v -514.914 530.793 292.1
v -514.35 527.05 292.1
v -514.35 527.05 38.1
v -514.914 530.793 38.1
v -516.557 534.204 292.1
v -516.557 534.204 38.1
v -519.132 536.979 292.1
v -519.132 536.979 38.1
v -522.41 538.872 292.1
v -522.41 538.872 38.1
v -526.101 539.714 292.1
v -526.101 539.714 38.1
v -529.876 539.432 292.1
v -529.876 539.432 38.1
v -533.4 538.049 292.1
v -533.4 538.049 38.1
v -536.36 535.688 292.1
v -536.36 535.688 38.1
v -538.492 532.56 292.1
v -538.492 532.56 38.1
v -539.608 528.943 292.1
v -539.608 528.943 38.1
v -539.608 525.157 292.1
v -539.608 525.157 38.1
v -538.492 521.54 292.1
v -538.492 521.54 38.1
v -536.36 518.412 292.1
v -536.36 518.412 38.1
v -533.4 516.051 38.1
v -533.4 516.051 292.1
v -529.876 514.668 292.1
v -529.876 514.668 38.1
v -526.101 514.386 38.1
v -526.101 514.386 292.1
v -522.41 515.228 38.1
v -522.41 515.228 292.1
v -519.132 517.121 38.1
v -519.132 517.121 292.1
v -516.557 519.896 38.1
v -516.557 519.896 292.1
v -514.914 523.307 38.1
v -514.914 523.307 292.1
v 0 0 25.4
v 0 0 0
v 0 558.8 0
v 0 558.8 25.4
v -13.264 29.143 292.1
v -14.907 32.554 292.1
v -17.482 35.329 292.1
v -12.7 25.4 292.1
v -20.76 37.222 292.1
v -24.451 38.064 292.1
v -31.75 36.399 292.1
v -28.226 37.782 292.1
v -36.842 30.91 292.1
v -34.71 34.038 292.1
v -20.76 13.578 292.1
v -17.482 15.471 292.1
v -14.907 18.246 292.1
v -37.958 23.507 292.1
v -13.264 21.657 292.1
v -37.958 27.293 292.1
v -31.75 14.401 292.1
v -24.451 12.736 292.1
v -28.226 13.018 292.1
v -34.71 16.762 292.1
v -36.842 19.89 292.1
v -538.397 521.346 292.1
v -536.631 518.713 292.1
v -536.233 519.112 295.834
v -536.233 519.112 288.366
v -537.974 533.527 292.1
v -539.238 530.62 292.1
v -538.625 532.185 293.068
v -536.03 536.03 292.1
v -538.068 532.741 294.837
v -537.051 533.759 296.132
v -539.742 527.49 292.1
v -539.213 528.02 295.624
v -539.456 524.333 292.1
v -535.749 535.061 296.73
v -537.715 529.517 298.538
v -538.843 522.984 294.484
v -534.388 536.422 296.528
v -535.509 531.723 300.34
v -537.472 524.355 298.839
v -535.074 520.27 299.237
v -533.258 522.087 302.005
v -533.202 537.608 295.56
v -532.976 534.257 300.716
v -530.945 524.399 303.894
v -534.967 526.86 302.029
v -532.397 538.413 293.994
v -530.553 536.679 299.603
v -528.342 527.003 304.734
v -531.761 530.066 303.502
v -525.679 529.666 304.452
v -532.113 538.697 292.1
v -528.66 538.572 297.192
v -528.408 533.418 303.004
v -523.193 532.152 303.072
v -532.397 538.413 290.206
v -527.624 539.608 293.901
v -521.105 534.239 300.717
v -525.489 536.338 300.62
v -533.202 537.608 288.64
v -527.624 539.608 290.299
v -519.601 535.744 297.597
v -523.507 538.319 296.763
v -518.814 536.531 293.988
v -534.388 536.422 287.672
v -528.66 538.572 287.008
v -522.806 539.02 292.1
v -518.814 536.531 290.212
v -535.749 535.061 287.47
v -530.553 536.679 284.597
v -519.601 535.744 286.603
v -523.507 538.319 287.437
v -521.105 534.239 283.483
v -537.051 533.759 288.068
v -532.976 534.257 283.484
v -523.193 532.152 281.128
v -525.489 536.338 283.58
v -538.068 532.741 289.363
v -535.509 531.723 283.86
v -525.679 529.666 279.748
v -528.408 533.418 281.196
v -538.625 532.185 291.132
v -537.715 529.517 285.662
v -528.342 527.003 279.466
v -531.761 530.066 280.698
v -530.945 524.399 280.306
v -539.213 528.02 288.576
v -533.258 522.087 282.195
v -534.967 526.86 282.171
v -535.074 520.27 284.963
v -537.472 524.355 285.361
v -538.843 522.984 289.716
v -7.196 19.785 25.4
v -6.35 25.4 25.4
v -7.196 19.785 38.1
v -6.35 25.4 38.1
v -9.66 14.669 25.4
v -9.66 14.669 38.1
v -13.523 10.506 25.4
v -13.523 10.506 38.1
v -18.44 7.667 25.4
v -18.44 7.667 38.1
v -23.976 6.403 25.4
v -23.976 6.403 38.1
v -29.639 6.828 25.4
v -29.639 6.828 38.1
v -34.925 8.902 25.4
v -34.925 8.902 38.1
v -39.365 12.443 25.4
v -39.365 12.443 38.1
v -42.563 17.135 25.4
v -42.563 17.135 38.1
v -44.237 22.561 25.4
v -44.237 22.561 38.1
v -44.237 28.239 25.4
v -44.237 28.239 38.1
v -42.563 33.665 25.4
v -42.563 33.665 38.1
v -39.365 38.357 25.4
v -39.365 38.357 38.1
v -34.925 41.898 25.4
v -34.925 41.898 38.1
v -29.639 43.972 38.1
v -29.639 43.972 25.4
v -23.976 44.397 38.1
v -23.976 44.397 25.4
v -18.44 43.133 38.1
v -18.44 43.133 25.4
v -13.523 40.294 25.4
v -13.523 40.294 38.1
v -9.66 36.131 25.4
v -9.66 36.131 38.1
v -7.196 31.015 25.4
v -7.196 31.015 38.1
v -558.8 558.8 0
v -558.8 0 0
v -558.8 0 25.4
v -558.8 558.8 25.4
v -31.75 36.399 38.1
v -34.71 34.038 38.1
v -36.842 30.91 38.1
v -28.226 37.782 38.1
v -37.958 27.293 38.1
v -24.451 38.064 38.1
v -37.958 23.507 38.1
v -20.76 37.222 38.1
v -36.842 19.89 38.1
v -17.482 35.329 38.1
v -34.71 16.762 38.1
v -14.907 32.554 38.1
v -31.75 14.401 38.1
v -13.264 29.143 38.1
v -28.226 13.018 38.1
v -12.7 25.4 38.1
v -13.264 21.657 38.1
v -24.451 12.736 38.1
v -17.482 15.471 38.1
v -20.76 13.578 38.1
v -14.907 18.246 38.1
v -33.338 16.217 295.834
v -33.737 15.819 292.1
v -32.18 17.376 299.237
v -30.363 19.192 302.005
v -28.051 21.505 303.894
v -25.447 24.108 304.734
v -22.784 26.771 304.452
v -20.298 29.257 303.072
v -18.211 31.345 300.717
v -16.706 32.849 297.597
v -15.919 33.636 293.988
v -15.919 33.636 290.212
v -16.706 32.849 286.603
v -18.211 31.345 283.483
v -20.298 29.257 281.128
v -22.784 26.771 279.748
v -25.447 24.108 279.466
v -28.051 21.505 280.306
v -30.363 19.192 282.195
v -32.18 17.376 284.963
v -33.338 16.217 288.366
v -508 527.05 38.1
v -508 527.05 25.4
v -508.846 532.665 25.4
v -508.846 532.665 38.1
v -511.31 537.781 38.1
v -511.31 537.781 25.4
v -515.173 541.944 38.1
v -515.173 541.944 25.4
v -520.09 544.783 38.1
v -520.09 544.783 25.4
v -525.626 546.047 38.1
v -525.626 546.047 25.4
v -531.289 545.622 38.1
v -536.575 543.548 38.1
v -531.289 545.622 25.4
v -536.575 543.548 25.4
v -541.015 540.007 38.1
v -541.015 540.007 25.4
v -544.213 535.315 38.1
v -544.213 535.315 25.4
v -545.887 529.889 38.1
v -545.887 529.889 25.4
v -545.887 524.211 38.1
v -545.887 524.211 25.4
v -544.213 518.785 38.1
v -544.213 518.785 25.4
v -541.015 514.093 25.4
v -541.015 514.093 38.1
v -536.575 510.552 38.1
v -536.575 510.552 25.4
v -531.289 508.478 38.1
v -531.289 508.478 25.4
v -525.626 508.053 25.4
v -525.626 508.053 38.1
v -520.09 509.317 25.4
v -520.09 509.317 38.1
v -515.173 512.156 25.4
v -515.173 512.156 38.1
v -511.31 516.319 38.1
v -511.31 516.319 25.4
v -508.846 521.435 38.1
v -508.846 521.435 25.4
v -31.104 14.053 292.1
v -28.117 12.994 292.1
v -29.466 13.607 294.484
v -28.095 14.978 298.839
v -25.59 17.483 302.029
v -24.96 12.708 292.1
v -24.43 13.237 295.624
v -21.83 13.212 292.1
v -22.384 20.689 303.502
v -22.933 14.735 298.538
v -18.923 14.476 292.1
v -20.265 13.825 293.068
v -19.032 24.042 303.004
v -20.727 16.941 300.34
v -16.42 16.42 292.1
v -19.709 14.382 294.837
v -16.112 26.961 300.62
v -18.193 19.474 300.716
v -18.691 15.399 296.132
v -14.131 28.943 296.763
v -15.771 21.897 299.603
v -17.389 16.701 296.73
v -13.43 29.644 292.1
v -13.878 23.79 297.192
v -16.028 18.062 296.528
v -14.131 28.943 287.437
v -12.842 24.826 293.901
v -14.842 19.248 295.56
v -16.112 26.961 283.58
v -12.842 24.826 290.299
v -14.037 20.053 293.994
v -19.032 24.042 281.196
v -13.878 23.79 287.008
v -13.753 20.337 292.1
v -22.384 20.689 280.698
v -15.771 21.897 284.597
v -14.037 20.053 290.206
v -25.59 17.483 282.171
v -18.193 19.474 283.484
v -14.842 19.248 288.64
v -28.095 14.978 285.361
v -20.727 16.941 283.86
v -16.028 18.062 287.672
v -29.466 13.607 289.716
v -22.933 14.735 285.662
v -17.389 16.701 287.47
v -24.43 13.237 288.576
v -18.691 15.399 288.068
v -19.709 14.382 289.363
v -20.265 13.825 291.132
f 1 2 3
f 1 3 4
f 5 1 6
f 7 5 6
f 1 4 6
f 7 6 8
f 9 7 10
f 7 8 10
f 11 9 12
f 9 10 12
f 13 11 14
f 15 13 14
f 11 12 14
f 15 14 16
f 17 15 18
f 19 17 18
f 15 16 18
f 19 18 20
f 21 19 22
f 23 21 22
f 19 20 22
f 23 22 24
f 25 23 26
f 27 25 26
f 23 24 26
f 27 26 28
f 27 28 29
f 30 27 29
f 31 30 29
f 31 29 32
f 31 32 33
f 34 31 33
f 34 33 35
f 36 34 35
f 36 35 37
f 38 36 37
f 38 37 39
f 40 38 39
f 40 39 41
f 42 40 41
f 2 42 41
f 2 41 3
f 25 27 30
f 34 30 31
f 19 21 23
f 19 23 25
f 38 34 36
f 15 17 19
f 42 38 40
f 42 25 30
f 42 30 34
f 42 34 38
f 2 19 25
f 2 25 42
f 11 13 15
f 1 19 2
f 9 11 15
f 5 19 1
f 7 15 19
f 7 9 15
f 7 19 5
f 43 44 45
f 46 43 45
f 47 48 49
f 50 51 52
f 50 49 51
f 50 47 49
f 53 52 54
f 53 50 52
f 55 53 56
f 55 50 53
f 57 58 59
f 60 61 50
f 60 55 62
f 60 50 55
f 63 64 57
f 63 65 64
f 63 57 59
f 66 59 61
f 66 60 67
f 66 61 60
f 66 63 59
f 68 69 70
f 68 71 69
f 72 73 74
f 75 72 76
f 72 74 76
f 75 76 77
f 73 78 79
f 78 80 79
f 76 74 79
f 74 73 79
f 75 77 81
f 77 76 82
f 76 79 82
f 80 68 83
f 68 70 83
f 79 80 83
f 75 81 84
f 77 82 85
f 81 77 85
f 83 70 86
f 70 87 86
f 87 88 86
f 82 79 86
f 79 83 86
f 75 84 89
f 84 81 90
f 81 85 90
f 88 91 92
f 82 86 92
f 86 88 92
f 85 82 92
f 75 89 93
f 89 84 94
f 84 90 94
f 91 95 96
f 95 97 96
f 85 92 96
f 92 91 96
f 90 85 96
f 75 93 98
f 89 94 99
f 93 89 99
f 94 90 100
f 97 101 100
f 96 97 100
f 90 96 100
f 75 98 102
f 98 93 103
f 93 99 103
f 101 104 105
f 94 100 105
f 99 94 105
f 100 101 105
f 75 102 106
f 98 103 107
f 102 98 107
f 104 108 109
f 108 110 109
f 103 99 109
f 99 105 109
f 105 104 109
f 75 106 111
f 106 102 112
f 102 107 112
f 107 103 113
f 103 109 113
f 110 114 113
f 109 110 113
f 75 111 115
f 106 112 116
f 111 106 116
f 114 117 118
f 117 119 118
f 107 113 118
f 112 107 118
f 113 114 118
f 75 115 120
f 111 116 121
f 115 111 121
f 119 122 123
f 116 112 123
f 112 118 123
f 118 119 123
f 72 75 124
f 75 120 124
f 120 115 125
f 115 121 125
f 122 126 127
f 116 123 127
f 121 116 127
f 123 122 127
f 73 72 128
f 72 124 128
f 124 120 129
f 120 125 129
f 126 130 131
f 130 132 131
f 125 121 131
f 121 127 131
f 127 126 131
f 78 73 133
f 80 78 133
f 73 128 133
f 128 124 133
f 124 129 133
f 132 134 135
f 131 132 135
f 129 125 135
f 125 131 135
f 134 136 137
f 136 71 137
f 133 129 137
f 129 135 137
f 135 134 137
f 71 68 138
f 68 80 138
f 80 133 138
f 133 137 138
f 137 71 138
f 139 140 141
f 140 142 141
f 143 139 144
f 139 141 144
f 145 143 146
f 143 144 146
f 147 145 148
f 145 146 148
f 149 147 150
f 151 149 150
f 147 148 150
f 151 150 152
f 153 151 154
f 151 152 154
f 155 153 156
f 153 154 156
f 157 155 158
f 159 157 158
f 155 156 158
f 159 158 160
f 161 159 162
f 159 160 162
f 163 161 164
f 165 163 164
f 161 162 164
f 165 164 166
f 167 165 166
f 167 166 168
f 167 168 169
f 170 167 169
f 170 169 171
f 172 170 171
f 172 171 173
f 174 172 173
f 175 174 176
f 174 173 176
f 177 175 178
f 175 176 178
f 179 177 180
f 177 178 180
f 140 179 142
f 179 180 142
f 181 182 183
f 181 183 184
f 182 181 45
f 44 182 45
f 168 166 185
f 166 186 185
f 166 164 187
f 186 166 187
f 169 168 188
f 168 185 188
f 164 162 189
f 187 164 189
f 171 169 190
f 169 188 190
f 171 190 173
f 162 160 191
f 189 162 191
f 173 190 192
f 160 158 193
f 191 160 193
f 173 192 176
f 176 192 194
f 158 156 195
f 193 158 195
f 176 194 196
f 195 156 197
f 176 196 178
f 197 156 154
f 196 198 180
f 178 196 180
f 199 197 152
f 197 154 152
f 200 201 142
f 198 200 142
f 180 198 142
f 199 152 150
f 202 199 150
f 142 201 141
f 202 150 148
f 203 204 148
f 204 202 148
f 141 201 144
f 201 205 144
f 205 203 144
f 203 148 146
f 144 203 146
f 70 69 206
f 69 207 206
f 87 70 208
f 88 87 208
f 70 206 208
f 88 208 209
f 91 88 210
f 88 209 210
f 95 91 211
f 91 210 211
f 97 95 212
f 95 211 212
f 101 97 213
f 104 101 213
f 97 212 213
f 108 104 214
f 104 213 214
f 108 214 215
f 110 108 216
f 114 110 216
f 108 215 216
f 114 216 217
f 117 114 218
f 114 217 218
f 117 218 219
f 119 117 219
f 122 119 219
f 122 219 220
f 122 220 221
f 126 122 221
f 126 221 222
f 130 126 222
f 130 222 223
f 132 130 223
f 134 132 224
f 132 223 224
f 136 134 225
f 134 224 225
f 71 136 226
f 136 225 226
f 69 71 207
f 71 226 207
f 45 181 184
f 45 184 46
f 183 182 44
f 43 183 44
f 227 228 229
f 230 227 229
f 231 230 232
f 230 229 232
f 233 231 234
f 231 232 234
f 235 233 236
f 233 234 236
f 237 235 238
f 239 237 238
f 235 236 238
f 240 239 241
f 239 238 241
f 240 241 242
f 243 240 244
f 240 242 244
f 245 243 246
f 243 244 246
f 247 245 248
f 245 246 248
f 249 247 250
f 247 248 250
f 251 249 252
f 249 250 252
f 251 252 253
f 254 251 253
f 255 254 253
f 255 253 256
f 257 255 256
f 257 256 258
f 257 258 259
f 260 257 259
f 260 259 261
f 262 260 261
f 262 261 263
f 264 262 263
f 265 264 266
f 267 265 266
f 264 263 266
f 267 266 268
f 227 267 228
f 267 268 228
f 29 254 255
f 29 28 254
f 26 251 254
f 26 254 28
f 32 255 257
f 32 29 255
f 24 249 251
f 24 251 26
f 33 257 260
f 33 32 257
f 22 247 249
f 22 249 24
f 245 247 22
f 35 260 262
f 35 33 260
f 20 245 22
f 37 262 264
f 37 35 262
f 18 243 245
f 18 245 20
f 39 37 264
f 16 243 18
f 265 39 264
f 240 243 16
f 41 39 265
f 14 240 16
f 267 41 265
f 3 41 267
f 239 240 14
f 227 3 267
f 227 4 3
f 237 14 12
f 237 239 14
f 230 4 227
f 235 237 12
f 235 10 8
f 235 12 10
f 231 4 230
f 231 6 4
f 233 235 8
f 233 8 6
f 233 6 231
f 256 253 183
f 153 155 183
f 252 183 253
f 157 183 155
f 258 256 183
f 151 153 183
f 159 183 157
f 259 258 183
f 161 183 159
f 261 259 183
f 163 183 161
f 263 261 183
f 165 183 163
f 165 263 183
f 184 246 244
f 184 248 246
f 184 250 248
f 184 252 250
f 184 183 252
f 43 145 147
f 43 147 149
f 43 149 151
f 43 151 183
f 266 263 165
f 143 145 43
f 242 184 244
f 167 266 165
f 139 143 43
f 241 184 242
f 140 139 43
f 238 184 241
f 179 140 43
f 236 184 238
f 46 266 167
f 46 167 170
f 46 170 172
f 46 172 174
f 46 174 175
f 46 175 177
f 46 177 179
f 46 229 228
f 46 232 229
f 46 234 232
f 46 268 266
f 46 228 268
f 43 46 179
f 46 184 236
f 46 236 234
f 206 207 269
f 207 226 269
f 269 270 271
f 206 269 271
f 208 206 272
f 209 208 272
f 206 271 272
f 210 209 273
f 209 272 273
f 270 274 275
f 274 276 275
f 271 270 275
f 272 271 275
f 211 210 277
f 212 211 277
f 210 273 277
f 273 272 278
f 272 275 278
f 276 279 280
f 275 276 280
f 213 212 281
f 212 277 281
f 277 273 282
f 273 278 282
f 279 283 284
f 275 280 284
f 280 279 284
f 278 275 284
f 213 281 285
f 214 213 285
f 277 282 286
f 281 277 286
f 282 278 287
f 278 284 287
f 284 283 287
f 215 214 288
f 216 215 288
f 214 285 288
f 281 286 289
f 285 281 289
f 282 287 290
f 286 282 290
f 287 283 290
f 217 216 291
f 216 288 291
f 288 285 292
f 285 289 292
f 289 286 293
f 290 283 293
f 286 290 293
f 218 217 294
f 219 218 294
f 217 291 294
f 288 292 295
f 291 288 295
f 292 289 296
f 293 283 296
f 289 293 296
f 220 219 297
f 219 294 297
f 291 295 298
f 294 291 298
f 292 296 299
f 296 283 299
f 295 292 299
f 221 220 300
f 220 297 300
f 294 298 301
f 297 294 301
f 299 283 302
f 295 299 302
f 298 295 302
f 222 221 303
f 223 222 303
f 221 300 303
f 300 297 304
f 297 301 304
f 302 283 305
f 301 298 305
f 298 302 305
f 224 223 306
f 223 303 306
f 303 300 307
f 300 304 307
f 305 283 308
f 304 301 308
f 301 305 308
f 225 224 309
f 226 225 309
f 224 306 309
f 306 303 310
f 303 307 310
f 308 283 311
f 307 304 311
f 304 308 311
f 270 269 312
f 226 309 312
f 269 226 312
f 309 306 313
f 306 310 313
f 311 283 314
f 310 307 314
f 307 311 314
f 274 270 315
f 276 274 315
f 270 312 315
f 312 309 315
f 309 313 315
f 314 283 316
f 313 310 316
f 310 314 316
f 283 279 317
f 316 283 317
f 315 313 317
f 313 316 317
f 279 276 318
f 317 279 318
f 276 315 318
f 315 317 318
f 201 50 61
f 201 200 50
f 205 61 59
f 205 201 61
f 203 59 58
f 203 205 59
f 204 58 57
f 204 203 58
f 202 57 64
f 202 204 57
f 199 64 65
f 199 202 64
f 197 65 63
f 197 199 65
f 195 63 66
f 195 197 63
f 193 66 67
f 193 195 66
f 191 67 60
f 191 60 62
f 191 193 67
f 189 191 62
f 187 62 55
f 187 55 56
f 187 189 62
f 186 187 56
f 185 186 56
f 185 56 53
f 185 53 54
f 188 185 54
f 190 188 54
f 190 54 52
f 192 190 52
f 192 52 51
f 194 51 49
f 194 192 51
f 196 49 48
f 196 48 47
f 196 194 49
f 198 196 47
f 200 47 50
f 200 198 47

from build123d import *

# Parameters (mm, degrees)
F0_W     = 558.8
F0_H     = 558.8
F1_DEPTH = 25.4
F3_W     = 12.7
F3_H     = 12.7
F5_R     = 19.05
F5_R_2   = 12.7
F6_DEPTH = 12.7
F7_DEPTH = 266.7
F8_DEPTH = 241.3


with BuildPart() as f1:
    # F0 (on Top) → F1 (new body)
    with BuildSketch(Plane.XY):
        with Locations((-279.4, 279.4)):
            Rectangle(F0_W, F0_H)
    extrude(amount=F1_DEPTH)

    # F3 (on offset) → F4 (revolve)
    with BuildSketch(Plane.XZ.offset(-25.4)):
        with Locations((-19.05, 44.45)):
            Rectangle(F3_W, F3_H)
        Polygon((-12.7, 38.1), (-25.4, 38.1), (-25.4, 25.4), (-6.35, 25.4), (-6.35, 38.1), align=None)
    revolve(axis=Axis((-25.4, 25.4, 38.1), (0, 0, -1)))

    # F5 (on face) → F6 (join)
    with BuildSketch(Plane.XY.offset(25.4)):
        with Locations((-527.05, 527.05)):
            Circle(F5_R)
        with Locations((-527.05, 527.05)):
            Circle(F5_R_2, mode=Mode.SUBTRACT)
    extrude(amount=F6_DEPTH)

    # F7 (add): a face of the model
    f7_faces = [f1.faces().sort_by_distance(p)[0] for p in [
        (-527.05, 527.05, 25.4),
    ]]
    extrude(f7_faces, amount=F7_DEPTH)

    # F8 (add): a face of the model
    f8_faces = [f1.faces().sort_by_distance(p)[0] for p in [
        (-25.4, 25.4, 50.8),
    ]]
    extrude(f8_faces, amount=F8_DEPTH)


with BuildPart() as f11:
    # F10 (on offset) → F11 (revolve)
    with BuildSketch(Plane.XY.offset(292.1)):
        with BuildLine():
            ThreePointArc((-34.9808489018, 17.0634938781), (-38.0923685167, 25.8402061306), (-34.3802561211, 34.3802561211))
            Line((-34.3802561211, 34.3802561211), (-518.0697438789, 518.0697438789))
            ThreePointArc((-518.0697438789, 518.0697438789), (-526.6097938694, 514.3576314833), (-535.3865061219, 517.4691510982))
            Line((-535.3865061219, 517.4691510982), (-34.9808489018, 17.0634938781))
        make_face()
        with BuildLine():
            ThreePointArc((-535.3865061219, 517.4691510982), (-526.6097938694, 514.3576314833), (-518.0697438789, 518.0697438789))
            Line((-518.0697438789, 518.0697438789), (-536.0302561211, 536.0302561211))
            ThreePointArc((-536.0302561211, 536.0302561211), (-539.7423685167, 527.4902061306), (-536.6308489018, 518.7134938781))
            Line((-536.6308489018, 518.7134938781), (-535.3865061219, 517.4691510982))
        make_face()
        with BuildLine():
            ThreePointArc((-33.7365061219, 15.8191510982), (-24.9597938694, 12.7076314833), (-16.4197438789, 16.4197438789))
            Line((-16.4197438789, 16.4197438789), (-34.3802561211, 34.3802561211))
            ThreePointArc((-34.3802561211, 34.3802561211), (-38.0923685167, 25.8402061306), (-34.9808489018, 17.0634938781))
            Line((-34.9808489018, 17.0634938781), (-33.7365061219, 15.8191510982))
        make_face()
    revolve(axis=Axis((-276.225, 276.225, 292.1), (-0.7071067812, 0.7071067812, 0)))


solid = Compound([f1.part, f11.part])
